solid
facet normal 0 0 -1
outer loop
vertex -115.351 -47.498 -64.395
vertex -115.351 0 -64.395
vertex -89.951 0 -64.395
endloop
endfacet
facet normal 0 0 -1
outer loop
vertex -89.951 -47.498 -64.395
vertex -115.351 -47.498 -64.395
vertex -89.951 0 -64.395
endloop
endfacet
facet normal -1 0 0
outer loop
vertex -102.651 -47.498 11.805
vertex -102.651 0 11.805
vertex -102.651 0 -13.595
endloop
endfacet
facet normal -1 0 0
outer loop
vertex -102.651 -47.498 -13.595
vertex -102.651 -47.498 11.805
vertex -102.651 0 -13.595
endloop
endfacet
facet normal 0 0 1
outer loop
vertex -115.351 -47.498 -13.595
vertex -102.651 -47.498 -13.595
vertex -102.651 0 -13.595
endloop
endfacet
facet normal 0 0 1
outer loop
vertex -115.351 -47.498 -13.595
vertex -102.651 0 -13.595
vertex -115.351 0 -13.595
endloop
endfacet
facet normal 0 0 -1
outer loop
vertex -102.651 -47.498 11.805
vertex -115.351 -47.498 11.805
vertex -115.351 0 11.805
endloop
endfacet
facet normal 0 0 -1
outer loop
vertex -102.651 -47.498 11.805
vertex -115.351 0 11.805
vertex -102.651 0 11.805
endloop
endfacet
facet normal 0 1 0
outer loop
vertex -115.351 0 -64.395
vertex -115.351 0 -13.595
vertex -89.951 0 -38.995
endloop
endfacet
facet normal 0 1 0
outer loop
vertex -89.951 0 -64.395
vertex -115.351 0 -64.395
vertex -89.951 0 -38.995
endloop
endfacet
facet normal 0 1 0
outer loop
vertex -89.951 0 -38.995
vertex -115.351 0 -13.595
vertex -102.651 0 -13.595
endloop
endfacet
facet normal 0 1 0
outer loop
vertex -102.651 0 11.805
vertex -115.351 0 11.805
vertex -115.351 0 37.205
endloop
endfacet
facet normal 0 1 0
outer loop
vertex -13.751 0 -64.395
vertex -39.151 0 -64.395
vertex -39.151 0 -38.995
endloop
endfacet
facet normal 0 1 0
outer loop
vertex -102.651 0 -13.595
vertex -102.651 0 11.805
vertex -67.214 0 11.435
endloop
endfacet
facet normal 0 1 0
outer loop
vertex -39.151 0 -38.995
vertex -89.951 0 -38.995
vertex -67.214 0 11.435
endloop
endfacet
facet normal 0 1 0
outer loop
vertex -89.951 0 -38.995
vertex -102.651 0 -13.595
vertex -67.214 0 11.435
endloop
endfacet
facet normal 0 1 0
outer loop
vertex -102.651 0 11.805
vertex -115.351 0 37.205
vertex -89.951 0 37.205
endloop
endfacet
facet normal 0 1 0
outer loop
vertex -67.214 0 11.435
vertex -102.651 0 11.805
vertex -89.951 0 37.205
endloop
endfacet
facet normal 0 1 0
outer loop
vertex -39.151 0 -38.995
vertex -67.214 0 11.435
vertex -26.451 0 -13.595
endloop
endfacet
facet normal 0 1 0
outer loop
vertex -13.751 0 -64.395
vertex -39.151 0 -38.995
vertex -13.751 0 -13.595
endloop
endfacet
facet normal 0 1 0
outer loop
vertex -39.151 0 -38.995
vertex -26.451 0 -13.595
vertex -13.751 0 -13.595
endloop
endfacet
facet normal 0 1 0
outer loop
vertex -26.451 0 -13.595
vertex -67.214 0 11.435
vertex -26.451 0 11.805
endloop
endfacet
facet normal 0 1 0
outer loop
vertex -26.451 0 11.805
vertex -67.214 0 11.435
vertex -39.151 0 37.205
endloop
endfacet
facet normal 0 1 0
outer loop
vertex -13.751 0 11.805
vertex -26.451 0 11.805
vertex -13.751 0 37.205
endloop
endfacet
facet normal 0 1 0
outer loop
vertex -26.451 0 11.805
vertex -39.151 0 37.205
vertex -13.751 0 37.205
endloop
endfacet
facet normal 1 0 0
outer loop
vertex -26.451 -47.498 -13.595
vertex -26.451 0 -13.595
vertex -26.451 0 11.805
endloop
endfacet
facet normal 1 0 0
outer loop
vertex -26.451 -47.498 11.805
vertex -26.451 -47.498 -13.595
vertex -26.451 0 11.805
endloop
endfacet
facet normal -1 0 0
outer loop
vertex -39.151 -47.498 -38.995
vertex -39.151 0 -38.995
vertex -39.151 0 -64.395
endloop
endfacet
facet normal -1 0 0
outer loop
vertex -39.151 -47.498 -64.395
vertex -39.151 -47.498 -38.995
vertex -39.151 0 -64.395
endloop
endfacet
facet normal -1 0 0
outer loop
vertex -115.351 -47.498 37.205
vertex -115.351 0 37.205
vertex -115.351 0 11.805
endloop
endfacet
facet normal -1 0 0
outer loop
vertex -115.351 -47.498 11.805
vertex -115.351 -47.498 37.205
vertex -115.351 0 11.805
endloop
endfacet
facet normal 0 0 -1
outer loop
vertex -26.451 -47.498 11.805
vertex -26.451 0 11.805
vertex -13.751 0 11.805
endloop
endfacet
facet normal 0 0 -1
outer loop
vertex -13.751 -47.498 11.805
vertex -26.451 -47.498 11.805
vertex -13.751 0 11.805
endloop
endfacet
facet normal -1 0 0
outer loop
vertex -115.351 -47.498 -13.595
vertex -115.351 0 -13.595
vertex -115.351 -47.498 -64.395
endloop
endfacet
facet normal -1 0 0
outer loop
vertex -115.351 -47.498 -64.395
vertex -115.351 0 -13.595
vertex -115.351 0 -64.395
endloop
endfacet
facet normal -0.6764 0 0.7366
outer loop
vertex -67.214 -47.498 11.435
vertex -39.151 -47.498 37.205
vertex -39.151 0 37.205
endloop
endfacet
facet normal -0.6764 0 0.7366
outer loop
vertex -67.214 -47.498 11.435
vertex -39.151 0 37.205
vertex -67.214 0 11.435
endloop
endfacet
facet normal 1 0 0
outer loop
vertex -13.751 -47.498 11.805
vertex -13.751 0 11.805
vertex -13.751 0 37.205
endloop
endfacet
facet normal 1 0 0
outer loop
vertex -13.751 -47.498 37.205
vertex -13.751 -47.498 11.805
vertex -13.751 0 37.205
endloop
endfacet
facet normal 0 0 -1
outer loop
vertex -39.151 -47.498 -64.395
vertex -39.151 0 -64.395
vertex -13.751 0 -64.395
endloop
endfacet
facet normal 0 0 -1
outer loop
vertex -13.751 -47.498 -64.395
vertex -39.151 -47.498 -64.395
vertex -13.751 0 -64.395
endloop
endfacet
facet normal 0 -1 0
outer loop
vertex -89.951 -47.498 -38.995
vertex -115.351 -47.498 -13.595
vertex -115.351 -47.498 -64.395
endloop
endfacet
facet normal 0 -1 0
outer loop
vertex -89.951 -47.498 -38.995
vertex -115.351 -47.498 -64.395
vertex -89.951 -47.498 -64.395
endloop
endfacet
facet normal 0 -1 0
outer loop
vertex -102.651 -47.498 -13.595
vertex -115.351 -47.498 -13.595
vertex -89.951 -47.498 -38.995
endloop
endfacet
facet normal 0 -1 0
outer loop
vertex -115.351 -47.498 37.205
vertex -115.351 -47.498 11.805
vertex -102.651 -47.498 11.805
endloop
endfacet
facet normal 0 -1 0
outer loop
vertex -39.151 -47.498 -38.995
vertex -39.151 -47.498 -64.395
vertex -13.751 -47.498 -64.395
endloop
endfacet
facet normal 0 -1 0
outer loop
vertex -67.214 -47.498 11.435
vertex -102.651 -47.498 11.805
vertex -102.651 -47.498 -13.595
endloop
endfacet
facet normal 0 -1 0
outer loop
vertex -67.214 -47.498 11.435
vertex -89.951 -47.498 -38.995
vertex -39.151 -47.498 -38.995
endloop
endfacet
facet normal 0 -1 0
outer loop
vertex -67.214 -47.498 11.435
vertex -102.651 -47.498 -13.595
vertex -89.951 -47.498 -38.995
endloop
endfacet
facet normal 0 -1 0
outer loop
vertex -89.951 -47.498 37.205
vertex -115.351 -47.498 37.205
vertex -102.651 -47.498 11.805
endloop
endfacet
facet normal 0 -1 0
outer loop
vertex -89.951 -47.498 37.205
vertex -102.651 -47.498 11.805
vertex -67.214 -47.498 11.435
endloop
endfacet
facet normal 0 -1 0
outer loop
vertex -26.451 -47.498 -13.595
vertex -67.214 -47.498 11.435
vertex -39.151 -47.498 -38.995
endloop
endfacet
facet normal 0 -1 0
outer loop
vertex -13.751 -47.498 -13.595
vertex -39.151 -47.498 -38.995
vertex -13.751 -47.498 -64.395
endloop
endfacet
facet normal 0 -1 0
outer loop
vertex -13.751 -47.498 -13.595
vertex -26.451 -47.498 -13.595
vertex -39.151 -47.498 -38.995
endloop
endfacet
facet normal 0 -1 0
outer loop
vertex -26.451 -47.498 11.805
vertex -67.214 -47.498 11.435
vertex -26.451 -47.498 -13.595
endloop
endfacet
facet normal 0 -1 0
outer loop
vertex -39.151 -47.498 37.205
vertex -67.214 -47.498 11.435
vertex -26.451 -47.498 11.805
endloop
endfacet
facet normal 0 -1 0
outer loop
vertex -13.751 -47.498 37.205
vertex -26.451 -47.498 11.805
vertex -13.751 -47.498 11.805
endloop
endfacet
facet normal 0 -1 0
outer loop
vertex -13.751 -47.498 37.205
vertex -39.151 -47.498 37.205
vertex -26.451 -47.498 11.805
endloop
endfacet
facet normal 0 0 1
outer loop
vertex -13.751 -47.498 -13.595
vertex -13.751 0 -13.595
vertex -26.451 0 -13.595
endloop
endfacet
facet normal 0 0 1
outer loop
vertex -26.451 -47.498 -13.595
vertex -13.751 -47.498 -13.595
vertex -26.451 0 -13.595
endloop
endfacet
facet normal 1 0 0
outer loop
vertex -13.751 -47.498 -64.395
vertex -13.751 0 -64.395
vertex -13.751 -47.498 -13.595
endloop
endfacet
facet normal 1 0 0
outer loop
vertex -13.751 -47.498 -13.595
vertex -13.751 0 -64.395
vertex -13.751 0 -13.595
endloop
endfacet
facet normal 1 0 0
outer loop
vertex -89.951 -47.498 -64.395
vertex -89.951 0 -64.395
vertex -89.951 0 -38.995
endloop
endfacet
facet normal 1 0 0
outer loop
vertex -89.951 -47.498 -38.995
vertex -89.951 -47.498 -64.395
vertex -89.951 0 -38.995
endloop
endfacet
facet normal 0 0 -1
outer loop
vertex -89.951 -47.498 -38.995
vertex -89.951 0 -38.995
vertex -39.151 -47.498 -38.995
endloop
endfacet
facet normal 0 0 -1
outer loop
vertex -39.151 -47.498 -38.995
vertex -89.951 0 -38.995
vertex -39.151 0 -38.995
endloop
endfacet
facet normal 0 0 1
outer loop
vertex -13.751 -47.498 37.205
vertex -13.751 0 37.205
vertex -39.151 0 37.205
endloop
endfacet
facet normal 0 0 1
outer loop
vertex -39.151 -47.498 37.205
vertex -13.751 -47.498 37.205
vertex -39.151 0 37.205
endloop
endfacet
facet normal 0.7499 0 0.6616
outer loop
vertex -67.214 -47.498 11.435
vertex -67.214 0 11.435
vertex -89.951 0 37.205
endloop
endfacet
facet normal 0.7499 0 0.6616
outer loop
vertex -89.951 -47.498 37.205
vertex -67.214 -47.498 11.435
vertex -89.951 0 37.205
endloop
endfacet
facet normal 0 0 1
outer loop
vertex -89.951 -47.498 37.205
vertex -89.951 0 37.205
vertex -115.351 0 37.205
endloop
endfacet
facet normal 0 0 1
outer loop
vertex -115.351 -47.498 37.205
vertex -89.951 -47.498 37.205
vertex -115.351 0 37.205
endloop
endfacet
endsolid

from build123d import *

# Parameters (mm, degrees)
F1_DEPTH = 47.498


with BuildPart() as f1:
    # F0 (on Front) → F1 (new body)
    with BuildSketch(Plane.XZ):
        Polygon((-26.450716, 11.804912), (-13.750716, 11.804912), (-13.750716, 37.204912), (-39.150716, 37.204912), (-67.213629, 11.435105), (-89.950716, 37.204912), (-115.350716, 37.204912), (-115.350716, 11.804912), (-102.650716, 11.804912), (-102.650716, -13.595088), (-115.350716, -13.595088), (-115.350716, -64.395088), (-89.950716, -64.395088), (-89.950716, -38.995088), (-39.150716, -38.995088), (-39.150716, -64.395088), (-13.750716, -64.395088), (-13.750716, -13.595088), (-26.450716, -13.595088), align=None)
    extrude(amount=F1_DEPTH)


solid = f1.part
